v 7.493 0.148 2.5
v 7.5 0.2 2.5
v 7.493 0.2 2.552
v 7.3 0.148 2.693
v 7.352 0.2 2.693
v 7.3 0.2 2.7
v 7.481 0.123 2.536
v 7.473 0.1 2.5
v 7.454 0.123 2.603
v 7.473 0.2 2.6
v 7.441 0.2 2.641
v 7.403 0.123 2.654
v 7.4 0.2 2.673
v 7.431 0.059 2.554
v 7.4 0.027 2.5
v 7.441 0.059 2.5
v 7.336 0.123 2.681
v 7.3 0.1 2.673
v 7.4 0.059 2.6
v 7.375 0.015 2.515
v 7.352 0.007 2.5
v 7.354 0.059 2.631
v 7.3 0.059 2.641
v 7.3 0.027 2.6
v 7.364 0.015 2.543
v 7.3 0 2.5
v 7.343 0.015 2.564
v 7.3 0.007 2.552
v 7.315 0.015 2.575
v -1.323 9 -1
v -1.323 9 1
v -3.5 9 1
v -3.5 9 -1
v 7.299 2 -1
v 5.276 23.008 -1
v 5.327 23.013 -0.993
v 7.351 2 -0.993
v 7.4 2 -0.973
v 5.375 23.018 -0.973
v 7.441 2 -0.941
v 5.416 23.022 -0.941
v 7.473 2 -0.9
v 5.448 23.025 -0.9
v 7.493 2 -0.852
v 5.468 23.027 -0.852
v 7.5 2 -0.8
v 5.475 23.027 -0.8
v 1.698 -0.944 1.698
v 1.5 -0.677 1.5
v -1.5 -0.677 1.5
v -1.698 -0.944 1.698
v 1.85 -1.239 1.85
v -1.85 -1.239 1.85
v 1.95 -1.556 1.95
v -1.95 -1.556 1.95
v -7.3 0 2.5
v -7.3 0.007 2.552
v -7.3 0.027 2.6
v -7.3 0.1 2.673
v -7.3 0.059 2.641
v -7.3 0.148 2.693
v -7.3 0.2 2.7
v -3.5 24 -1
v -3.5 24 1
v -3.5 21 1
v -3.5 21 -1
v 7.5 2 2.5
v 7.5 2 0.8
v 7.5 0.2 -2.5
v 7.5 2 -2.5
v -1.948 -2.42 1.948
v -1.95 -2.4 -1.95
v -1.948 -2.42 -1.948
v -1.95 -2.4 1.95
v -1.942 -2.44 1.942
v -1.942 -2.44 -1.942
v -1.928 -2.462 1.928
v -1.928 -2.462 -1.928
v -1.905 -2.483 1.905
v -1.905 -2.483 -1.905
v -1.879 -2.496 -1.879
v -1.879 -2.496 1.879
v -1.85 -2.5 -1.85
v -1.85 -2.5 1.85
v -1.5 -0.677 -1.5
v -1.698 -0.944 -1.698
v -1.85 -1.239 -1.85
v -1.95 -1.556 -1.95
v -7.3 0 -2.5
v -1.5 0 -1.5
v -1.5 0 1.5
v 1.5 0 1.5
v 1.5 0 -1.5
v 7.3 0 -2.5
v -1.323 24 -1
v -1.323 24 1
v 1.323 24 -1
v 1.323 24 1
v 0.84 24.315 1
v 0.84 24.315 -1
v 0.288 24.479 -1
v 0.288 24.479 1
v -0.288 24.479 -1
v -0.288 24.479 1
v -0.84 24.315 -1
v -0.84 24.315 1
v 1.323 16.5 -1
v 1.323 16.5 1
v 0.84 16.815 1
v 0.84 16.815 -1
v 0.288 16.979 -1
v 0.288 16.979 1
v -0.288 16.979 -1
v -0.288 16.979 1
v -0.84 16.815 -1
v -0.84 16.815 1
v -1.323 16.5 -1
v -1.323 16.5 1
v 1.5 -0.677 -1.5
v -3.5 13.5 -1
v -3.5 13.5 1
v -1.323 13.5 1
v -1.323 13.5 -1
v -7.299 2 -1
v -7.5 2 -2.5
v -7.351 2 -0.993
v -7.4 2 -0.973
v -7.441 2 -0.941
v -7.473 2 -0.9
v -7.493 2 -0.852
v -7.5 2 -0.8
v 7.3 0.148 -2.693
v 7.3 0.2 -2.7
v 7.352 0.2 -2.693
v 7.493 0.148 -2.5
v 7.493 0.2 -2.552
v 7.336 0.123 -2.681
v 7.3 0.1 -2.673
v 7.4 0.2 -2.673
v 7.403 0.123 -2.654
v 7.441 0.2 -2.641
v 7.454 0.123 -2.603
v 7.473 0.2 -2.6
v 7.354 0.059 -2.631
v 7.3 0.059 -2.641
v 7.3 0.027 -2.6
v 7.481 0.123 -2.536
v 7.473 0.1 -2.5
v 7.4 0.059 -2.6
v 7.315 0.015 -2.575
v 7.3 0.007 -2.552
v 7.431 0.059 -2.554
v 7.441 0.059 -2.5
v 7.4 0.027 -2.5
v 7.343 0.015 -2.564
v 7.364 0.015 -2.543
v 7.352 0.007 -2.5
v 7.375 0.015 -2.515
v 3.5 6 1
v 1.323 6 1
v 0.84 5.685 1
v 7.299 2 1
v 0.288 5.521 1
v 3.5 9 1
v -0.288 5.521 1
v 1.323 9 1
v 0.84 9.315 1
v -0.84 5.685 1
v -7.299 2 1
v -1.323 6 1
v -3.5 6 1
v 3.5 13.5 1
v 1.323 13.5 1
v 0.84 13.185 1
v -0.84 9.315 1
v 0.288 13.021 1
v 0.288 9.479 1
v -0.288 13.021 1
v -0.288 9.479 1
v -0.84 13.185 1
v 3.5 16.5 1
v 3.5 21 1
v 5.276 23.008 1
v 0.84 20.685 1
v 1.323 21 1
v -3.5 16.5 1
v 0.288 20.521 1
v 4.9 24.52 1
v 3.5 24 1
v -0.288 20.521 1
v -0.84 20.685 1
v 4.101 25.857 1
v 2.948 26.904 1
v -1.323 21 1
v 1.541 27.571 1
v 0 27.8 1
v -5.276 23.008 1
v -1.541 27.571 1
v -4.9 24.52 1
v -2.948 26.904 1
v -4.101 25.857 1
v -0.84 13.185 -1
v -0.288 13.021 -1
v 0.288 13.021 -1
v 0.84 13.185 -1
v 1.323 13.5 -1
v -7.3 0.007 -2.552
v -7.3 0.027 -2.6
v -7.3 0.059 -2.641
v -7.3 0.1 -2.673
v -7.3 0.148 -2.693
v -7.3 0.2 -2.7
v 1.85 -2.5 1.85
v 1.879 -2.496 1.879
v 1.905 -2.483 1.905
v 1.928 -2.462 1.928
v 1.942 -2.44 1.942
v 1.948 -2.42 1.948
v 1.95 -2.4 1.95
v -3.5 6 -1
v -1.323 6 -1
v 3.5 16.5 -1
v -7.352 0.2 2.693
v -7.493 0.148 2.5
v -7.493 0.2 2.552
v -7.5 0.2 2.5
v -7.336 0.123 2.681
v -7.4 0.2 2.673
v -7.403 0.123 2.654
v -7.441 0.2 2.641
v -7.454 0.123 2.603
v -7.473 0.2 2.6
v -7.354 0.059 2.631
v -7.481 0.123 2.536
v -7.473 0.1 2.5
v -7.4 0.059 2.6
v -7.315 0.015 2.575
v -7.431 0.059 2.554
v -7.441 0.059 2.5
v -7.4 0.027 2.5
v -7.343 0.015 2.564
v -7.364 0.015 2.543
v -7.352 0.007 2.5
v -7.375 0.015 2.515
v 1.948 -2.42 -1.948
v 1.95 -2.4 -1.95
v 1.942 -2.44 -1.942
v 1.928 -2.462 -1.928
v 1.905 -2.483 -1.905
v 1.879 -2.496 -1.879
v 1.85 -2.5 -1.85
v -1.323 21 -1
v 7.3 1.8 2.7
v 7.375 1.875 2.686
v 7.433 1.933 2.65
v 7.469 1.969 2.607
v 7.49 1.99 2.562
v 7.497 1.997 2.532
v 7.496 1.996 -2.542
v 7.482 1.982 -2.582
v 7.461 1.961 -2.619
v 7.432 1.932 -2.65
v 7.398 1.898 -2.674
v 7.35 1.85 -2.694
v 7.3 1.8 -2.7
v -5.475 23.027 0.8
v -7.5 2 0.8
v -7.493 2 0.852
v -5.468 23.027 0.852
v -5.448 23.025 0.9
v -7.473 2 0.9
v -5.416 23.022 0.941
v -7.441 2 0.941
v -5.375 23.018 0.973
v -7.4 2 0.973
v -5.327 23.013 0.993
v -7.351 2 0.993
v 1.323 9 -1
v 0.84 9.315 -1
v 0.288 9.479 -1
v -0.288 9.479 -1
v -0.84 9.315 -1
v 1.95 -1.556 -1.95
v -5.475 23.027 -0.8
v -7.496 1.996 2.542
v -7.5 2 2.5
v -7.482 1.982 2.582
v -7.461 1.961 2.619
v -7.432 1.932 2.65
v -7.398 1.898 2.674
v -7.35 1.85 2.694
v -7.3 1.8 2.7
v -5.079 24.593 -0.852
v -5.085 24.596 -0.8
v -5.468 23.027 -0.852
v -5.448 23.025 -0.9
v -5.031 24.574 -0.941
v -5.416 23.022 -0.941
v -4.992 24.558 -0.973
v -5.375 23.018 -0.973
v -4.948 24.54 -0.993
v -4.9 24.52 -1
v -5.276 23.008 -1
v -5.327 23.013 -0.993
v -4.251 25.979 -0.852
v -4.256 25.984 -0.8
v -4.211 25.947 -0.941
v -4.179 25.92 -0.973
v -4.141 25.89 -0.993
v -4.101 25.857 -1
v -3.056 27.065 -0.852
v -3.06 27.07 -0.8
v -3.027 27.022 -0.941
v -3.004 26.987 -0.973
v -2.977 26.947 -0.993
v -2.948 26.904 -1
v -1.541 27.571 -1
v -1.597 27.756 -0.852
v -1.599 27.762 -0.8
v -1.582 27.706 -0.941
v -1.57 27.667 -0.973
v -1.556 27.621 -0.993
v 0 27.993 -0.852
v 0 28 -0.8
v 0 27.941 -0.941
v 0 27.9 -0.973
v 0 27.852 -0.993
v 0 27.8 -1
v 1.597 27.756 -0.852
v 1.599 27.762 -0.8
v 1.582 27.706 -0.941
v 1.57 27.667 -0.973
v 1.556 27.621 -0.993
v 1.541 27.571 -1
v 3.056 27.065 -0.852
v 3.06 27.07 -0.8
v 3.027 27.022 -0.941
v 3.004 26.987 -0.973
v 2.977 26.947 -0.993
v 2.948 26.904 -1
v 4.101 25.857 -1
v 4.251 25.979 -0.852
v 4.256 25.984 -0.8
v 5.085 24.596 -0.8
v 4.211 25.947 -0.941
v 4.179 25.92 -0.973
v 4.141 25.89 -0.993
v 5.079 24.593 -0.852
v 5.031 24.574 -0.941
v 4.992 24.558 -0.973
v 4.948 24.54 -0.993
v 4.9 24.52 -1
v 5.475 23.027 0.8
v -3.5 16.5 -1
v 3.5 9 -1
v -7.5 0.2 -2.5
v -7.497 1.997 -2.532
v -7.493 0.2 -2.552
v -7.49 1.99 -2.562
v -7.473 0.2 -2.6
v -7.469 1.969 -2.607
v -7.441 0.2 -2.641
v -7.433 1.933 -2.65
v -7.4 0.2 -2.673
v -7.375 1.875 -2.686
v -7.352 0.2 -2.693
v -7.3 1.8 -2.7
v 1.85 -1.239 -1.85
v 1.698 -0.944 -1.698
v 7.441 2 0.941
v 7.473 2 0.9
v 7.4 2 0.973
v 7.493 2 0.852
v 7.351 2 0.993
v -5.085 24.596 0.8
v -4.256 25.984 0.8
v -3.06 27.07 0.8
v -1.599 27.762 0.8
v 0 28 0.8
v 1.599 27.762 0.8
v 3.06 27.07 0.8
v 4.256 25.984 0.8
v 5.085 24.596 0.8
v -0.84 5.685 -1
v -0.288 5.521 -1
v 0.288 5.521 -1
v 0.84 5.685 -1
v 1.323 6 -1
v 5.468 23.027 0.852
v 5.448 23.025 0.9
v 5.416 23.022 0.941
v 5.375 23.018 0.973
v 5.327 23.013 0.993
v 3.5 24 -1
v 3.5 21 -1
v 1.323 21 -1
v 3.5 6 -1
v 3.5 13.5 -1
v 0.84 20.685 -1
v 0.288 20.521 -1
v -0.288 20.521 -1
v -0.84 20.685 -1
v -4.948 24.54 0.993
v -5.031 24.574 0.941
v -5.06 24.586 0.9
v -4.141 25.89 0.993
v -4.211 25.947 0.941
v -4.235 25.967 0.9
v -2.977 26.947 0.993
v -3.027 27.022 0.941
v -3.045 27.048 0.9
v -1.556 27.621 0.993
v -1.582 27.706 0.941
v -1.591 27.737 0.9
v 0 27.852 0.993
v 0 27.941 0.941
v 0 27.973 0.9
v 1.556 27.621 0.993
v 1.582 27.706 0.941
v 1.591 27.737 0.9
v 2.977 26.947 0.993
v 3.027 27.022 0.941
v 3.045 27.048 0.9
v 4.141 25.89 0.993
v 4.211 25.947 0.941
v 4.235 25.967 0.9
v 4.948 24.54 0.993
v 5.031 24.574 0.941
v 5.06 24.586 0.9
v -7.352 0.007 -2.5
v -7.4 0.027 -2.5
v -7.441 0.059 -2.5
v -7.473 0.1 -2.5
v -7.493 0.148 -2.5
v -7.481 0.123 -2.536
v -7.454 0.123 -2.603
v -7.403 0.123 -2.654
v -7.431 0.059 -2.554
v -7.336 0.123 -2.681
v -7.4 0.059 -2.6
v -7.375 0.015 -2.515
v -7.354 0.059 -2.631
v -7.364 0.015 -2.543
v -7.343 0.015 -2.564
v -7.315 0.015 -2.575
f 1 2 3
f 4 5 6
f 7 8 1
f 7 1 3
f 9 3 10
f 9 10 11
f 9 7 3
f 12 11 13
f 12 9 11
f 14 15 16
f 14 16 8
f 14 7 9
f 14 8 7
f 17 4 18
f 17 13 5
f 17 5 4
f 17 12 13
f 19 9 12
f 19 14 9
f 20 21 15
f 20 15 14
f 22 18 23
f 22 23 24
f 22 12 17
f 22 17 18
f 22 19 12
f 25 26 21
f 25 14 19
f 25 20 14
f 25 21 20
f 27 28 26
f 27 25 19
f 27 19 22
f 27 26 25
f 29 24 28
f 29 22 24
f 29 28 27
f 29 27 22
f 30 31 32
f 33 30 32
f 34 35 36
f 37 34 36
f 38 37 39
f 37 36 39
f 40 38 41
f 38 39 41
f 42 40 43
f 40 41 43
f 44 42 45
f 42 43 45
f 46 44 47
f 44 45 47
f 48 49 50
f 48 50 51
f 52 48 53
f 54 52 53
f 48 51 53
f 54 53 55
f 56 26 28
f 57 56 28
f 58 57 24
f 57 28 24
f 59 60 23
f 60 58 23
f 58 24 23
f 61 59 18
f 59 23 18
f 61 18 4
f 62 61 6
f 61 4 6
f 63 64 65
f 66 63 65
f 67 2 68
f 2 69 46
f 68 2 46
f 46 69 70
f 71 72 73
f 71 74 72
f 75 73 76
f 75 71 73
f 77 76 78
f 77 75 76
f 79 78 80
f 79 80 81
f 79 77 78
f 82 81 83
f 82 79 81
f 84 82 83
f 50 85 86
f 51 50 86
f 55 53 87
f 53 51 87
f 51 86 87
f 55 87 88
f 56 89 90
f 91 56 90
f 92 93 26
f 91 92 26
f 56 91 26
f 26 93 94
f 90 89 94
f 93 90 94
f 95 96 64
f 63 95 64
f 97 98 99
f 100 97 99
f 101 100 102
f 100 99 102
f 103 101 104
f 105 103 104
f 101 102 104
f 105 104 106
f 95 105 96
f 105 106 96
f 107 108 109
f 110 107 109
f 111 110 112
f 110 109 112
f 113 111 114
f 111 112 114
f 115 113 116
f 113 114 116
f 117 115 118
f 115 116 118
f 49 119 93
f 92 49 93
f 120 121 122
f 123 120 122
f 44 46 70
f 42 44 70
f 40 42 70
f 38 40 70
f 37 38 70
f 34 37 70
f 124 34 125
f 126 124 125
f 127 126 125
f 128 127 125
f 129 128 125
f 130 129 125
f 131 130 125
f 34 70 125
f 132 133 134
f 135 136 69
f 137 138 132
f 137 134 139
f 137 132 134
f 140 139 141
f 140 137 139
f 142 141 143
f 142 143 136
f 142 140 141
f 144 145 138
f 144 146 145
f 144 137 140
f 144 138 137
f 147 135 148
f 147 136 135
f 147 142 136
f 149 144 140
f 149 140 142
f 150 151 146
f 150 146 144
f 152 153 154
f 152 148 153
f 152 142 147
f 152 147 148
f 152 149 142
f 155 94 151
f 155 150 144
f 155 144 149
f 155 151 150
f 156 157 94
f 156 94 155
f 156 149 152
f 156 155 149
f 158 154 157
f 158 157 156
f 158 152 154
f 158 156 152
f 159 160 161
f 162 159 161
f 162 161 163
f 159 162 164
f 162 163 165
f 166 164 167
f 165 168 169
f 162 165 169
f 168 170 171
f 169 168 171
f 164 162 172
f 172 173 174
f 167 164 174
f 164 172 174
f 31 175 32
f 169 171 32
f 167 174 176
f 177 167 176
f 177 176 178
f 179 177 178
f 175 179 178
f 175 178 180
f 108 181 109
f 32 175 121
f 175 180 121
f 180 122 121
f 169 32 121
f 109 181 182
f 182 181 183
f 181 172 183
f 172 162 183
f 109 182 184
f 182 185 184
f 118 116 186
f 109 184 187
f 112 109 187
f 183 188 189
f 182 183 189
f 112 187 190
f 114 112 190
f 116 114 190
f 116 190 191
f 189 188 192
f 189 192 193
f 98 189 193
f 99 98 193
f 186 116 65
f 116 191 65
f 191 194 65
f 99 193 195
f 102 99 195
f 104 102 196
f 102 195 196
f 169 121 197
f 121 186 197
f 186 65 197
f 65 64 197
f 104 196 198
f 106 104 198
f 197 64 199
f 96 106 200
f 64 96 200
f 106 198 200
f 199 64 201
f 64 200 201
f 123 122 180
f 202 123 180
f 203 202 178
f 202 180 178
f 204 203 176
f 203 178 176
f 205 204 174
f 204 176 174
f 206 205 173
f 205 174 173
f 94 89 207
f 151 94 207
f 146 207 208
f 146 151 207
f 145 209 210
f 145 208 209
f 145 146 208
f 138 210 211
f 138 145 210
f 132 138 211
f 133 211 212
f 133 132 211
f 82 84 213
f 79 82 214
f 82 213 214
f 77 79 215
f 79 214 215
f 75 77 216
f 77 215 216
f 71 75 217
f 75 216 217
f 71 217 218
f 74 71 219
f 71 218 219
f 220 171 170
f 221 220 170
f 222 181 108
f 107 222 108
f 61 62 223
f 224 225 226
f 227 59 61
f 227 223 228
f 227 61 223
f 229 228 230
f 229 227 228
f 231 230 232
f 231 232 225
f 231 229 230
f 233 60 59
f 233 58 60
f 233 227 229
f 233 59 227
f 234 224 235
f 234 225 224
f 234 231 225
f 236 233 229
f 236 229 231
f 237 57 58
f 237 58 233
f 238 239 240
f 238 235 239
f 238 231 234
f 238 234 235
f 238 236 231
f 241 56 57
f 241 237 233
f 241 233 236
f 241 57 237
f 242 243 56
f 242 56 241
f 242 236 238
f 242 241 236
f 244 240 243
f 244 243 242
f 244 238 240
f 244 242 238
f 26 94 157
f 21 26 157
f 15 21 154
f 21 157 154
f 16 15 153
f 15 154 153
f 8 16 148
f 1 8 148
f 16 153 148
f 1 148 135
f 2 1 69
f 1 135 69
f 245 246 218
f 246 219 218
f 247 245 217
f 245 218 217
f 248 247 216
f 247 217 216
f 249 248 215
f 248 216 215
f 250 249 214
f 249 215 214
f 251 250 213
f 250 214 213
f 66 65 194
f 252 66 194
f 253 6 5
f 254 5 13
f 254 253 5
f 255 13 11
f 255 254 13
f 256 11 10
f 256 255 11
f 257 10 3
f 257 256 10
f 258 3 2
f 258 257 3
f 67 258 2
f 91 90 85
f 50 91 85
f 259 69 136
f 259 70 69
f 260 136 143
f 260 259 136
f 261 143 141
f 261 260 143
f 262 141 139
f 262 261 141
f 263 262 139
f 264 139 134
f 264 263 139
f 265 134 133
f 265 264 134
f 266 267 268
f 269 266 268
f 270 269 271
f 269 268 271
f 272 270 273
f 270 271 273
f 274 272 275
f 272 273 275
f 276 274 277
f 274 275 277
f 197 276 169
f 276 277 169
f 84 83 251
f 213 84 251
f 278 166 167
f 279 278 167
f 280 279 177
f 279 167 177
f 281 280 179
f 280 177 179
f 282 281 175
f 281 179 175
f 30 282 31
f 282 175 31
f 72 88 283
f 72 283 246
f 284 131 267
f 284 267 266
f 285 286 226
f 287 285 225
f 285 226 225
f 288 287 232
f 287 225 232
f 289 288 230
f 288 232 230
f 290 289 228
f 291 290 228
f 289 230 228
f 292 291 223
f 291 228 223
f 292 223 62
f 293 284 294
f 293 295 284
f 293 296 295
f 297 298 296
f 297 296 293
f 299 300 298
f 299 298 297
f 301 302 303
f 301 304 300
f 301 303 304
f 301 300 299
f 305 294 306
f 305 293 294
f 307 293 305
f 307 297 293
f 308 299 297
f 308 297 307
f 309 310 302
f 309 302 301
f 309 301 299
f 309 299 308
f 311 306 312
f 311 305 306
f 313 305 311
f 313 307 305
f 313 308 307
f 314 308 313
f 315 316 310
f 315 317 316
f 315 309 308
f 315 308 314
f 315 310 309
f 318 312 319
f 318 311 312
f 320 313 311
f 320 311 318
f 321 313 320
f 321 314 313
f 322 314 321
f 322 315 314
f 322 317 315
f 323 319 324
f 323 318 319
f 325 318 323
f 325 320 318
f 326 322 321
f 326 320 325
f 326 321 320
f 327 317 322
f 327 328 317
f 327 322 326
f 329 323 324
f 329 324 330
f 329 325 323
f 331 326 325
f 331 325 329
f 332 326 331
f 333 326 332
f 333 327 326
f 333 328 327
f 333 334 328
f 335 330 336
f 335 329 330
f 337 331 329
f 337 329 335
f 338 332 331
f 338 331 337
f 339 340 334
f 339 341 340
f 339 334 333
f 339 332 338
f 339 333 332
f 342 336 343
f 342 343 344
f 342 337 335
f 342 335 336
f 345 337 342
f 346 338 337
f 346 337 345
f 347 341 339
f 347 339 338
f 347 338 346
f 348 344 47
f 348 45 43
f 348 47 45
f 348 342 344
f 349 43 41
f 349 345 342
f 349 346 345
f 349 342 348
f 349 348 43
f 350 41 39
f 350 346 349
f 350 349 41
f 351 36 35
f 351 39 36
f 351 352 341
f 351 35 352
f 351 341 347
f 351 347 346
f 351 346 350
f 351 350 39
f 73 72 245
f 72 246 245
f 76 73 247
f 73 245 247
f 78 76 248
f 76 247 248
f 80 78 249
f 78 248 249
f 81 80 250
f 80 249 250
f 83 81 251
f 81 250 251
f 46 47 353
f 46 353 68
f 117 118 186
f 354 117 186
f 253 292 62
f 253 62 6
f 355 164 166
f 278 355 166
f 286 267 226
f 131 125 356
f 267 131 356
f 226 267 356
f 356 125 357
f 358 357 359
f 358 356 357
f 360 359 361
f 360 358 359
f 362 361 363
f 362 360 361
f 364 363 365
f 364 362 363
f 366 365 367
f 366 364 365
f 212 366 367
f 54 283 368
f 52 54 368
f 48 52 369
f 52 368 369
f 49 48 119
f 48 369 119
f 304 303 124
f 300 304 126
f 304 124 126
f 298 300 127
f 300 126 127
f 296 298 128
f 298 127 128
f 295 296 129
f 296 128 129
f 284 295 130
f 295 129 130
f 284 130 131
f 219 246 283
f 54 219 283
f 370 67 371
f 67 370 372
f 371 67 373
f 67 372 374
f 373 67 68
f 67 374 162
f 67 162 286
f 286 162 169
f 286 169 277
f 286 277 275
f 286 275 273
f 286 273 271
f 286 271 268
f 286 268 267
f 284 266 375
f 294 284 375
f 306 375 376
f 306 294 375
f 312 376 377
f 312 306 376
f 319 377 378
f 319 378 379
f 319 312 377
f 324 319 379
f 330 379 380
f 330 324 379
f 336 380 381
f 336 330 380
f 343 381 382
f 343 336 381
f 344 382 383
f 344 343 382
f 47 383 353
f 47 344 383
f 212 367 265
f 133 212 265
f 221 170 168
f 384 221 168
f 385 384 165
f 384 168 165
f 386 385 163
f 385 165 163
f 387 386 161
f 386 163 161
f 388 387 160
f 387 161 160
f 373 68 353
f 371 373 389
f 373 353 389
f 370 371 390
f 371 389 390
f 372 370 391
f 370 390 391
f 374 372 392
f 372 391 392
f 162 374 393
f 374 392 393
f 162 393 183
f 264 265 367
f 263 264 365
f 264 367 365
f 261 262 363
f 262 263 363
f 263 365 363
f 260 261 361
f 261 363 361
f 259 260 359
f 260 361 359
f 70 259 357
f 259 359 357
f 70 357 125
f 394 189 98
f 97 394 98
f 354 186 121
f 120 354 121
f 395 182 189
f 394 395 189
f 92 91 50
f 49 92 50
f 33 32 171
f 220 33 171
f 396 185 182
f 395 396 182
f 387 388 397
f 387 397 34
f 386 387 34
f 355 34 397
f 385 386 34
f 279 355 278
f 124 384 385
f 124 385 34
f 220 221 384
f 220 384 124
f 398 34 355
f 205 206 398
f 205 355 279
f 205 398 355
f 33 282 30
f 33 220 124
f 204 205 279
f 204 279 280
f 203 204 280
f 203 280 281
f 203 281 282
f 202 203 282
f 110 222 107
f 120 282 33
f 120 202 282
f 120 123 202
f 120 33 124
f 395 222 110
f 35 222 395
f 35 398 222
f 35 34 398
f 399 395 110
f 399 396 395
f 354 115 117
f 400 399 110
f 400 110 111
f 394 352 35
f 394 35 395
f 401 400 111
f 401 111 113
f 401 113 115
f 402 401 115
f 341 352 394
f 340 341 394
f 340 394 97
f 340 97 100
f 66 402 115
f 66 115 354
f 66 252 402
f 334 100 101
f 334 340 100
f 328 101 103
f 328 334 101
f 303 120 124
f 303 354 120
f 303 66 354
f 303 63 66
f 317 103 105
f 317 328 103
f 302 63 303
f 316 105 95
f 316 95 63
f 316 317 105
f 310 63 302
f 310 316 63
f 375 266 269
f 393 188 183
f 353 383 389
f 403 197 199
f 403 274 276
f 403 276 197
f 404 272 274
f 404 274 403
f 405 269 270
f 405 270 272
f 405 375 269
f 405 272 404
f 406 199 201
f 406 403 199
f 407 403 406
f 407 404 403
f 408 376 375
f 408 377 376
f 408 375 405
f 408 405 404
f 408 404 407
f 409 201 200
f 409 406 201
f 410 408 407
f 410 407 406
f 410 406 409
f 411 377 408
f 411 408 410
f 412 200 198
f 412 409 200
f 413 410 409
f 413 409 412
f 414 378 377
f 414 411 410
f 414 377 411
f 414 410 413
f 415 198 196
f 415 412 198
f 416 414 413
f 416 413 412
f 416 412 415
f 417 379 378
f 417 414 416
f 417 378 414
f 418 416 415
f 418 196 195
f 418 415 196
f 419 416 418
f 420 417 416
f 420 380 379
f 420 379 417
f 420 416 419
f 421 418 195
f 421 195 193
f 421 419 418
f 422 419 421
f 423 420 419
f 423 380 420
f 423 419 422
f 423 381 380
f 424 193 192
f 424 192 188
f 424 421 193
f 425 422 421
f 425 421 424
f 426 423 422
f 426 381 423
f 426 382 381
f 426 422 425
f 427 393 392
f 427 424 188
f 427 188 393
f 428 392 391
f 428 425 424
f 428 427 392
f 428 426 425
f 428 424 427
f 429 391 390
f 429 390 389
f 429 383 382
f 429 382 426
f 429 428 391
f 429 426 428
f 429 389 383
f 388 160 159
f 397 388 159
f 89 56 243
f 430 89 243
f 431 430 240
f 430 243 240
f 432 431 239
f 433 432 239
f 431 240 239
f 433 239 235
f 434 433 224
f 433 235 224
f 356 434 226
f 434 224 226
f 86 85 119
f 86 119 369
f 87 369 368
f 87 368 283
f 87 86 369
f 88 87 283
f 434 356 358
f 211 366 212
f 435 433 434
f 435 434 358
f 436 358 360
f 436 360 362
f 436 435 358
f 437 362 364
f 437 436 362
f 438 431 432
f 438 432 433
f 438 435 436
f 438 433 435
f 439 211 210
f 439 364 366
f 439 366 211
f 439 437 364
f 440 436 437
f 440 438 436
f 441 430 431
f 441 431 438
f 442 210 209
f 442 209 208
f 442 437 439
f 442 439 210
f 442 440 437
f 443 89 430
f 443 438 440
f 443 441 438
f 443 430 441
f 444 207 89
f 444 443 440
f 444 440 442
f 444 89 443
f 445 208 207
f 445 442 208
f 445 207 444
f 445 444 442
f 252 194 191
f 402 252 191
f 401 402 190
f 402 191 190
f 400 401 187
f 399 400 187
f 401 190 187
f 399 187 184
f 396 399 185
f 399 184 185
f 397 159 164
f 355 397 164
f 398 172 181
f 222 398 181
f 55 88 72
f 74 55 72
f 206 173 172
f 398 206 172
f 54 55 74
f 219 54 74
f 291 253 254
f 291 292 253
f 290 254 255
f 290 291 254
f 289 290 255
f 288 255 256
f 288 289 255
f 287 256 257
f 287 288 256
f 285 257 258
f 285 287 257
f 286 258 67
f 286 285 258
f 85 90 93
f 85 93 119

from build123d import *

# Parameters (mm, degrees)
EXTRUDE_1_DEPTH          = 2.7
EXTRUDE_1_DEPTH_BACK     = 2.7
EXTRUDE_2_DEPTH          = 1
EXTRUDE_2_DEPTH_BACK     = 1
CUT_EXTRUDE_1_DEPTH      = 30.222251796
PATTERN_LINEAR_1_COUNT   = 3
PATTERN_LINEAR_1_PITCH   = 7.5
EXTRUDE_3_DEPTH          = 2
EXTRUDE_3_DEPTH_BACK     = 2
CUT_EXTRUDE_2_DEPTH      = 2
CUT_EXTRUDE_2_DEPTH_BACK = 2
FILLET_1_R               = 0.1
FILLET_4_R               = 0.2
FILLET_5_R               = 0.2
FILLET_8_R               = 0.2


with BuildPart() as part:
    # 草图1 → 凸台-拉伸1 (new, two sides: drawn at the far end of the back side and taken through both)
    with BuildSketch(Plane.XY.offset(-EXTRUDE_1_DEPTH_BACK)):
        Polygon((0, 0), (7.5, 0), (7.5, 2), (-7.5, 2), (-7.5, 0), align=None)
    extrude(amount=EXTRUDE_1_DEPTH + EXTRUDE_1_DEPTH_BACK)

    # 草图2 → 凸台-拉伸2 (add, two sides: drawn at the far end of the back side and taken through both)
    with BuildSketch(Plane.XY.offset(-EXTRUDE_2_DEPTH_BACK)):
        with BuildLine():
            Line((-7.5, 2), (-5.474663278, 23.027315834))
            ThreePointArc((-5.474663278, 23.027315834), (0, 28), (5.474663278, 23.027315834))
            Line((5.474663278, 23.027315834), (7.5, 2))
            Line((7.5, 2), (-7.5, 2))
        make_face()
    extrude(amount=EXTRUDE_2_DEPTH + EXTRUDE_2_DEPTH_BACK)

    # 草图3 → 切除-拉伸1 (cut, through all)
    with BuildSketch(Plane.XY.offset(1)):
        with BuildLine():
            Line((3.5, 6), (3.5, 9))
            Line((3.5, 9), (1.322875656, 9))
            ThreePointArc((1.322875656, 9), (0, 9.5), (-1.322875656, 9))
            Line((-1.322875656, 9), (-3.5, 9))
            Line((-3.5, 9), (-3.5, 6))
            Line((-3.5, 6), (-1.322875656, 6))
            ThreePointArc((-1.322875656, 6), (0, 5.5), (1.322875656, 6))
            Line((1.322875656, 6), (3.5, 6))
        make_face()
    cut_extrude_1 = extrude(amount=-CUT_EXTRUDE_1_DEPTH, mode=Mode.SUBTRACT)

    # 阵列(线性)1: 切除-拉伸1 ×3
    with Locations(*[(0, i * PATTERN_LINEAR_1_PITCH, 0) for i in range(1, PATTERN_LINEAR_1_COUNT)]):
        add(cut_extrude_1, mode=Mode.SUBTRACT)

    # 草图4 → 凸台-拉伸3 (add, two sides: drawn at the far end of the back side and taken through both)
    with BuildSketch(Plane.XY.offset(-EXTRUDE_3_DEPTH_BACK)):
        with BuildLine():
            Line((1.5, 0), (-1.5, 0))
            Line((-1.5, 0), (-1.5, -0.677124344))
            ThreePointArc((-1.5, -0.677124344), (-1.780042303, -1.088161527), (-1.95, -1.555590279))
            Line((-1.95, -1.555590279), (-1.95, -2.5))
            Line((-1.95, -2.5), (1.95, -2.5))
            Line((1.95, -2.5), (1.95, -1.555590279))
            ThreePointArc((1.95, -1.555590279), (1.780042303, -1.088161527), (1.5, -0.677124344))
            Line((1.5, -0.677124344), (1.5, 0))
        make_face()
    extrude(amount=EXTRUDE_3_DEPTH + EXTRUDE_3_DEPTH_BACK)

    # 草图5 → 切除-拉伸2 (cut, two sides: drawn at the far end of the back side and taken through both)
    with BuildSketch(Plane(origin=(0, 0, 0), x_dir=(0, 0, -1), z_dir=(1, 0, 0)).offset(-CUT_EXTRUDE_2_DEPTH_BACK)):
        with BuildLine():
            Line((1.5, 0), (1.5, -0.677124344))
            ThreePointArc((1.5, -0.677124344), (1.780042303, -1.088161527), (1.95, -1.555590279))
            Line((1.95, -1.555590279), (1.95, -2.5))
            Line((1.95, -2.5), (2, -2.5))
            Line((2, -2.5), (2, 0))
            Line((2, 0), (1.5, 0))
        make_face()
        with BuildLine():
            Line((-2, 0), (-1.5, 0))
            Line((-1.5, 0), (-1.5, -0.677124344))
            ThreePointArc((-1.5, -0.677124344), (-1.780042303, -1.088161527), (-1.95, -1.555590279))
            Line((-1.95, -1.555590279), (-1.95, -2.5))
            Line((-1.95, -2.5), (-2, -2.5))
            Line((-2, -2.5), (-2, 0))
        make_face()
    extrude(amount=CUT_EXTRUDE_2_DEPTH + CUT_EXTRUDE_2_DEPTH_BACK, mode=Mode.SUBTRACT)

    # 圆角1
    fillet_1_edges = [part.edges().sort_by_distance(p)[0] for p in [
        (-1.95, -2.5, 0),
        (1.95, -2.5, 0),
        (0, -2.5, -1.95),
        (0, -2.5, 1.95),
    ]]
    fillet(fillet_1_edges, radius=FILLET_1_R)

    # 圆角4
    fillet_4_edges = [part.edges().sort_by_distance(p)[0] for p in [
        (-7.5, 1, 2.7),
        (0, 2, 2.7),
        (7.5, 1, 2.7),
        (0, 0, 2.7),
        (7.5, 1, -2.7),
        (0, 2, -2.7),
        (-7.5, 1, -2.7),
        (0, 0, -2.7),
    ]]
    fillet(fillet_4_edges, radius=FILLET_4_R)

    # 圆角5
    # the kernel refuses this fillet: 0.2 mm, written as the material it takes off along each edge
    with BuildSketch(Plane(origin=(7.3, 0.2, 2.5), x_dir=(1, 0, 0), z_dir=(0, -1, 0))) as fillet_5_piece_1_section:
        Polygon((0, 0), (FILLET_5_R, 0), (FILLET_5_R, FILLET_5_R), (0, FILLET_5_R), align=None)
    fillet_5_piece_1 = extrude(amount=FILLET_5_R, mode=Mode.PRIVATE)
    fillet_5_piece_1 = fillet_5_piece_1 - Plane(origin=(7.3, 0.2, 2.5), x_dir=(-0.7071067811865475, 0, -0.7071067811865475), z_dir=(0, -1, 0)) * Sphere(FILLET_5_R, mode=Mode.PRIVATE)
    add(fillet_5_piece_1, mode=Mode.SUBTRACT)
    with BuildSketch(Plane(origin=(-7.3, 0.2, 2.5), x_dir=(-1, 0, 0), z_dir=(0, -1, 0))) as fillet_5_piece_2_section:
        Polygon((0, 0), (FILLET_5_R, 0), (FILLET_5_R, -FILLET_5_R), (0, -FILLET_5_R), align=None)
    fillet_5_piece_2 = extrude(amount=FILLET_5_R, mode=Mode.PRIVATE)
    fillet_5_piece_2 = fillet_5_piece_2 - Plane(origin=(-7.3, 0.2, 2.5), x_dir=(0.7071067811865475, 1.2560739669470211e-15, -0.7071067811865475), z_dir=(0, -1, 0)) * Sphere(FILLET_5_R, mode=Mode.PRIVATE)
    add(fillet_5_piece_2, mode=Mode.SUBTRACT)
    with BuildSketch(Plane(origin=(-7.3, 0.2, -2.5), x_dir=(-1, 0, 0), z_dir=(0, -1, 0))) as fillet_5_piece_3_section:
        Polygon((0, 0), (FILLET_5_R, 0), (FILLET_5_R, FILLET_5_R), (0, FILLET_5_R), align=None)
    fillet_5_piece_3 = extrude(amount=FILLET_5_R, mode=Mode.PRIVATE)
    fillet_5_piece_3 = fillet_5_piece_3 - Plane(origin=(-7.3, 0.2, -2.5), x_dir=(0.7071067811865475, 1.2560739669470211e-15, 0.7071067811865475), z_dir=(0, -1, 0)) * Sphere(FILLET_5_R, mode=Mode.PRIVATE)
    add(fillet_5_piece_3, mode=Mode.SUBTRACT)
    with BuildSketch(Plane(origin=(7.3, 0.2, -2.5), x_dir=(1, 0, 0), z_dir=(0, -1, 0))) as fillet_5_piece_4_section:
        Polygon((0, 0), (FILLET_5_R, 0), (FILLET_5_R, -FILLET_5_R), (0, -FILLET_5_R), align=None)
    fillet_5_piece_4 = extrude(amount=FILLET_5_R, mode=Mode.PRIVATE)
    fillet_5_piece_4 = fillet_5_piece_4 - Plane(origin=(7.3, 0.2, -2.5), x_dir=(-0.7071067811865475, 0, 0.7071067811865475), z_dir=(0, -1, 0)) * Sphere(FILLET_5_R, mode=Mode.PRIVATE)
    add(fillet_5_piece_4, mode=Mode.SUBTRACT)
    with BuildSketch(Plane(origin=(-7.5, 0, 2.5), x_dir=(1, 0, 0), z_dir=(0, 0, -1)), Plane(origin=(7.5, 0, -2.5), x_dir=(-1, 0, 0), z_dir=(0, 0, 1))) as fillet_5_piece_5:
        with BuildLine():
            CenterArc((FILLET_5_R, -FILLET_5_R), FILLET_5_R, 90, 90)
            Line((0, -FILLET_5_R), (0, 0))
            Line((0, 0), (FILLET_5_R, 0))
        make_face()
    extrude(amount=5, mode=Mode.SUBTRACT)

    # 圆角8
    # the kernel refuses this fillet: 0.2 mm, written as the material it takes off along each edge
    with BuildSketch(Plane(origin=(-7.547937803, 1.502303338, 1), x_dir=(0, 0, -1), z_dir=(0.09587560610090687, 0.9953933233424785, 0))) as fillet_8_piece_1_section:
        with BuildLine():
            CenterArc((FILLET_8_R, -FILLET_8_R), FILLET_8_R, 90, 90)
            Line((0, -FILLET_8_R), (0, 0))
            Line((0, 0), (FILLET_8_R, 0))
        make_face()
    fillet_8_piece_1 = extrude(amount=21.624630174, mode=Mode.PRIVATE)
    fillet_8_piece_1 = split(fillet_8_piece_1, bisect_by=Plane(origin=(-6.442060612, 2, 0.954715968), z_dir=(0, 1, 0)), keep=Keep.TOP, mode=Mode.PRIVATE)
    add(fillet_8_piece_1, mode=Mode.SUBTRACT)
    with BuildSketch(Plane(origin=(5.474663278, 23.027315834, -1), x_dir=(0, 0, 1), z_dir=(0.09587560610090687, -0.9953933233424785, 0))) as fillet_8_piece_2_section:
        with BuildLine():
            CenterArc((FILLET_8_R, FILLET_8_R), FILLET_8_R, 180, 90)
            Line((0, FILLET_8_R), (0, 0))
            Line((0, 0), (FILLET_8_R, 0))
        make_face()
    fillet_8_piece_2 = extrude(amount=21.624630174, mode=Mode.PRIVATE)
    fillet_8_piece_2 = split(fillet_8_piece_2, bisect_by=Plane(origin=(6.442060612, 2, -0.954715968), z_dir=(0, 1, 0)), keep=Keep.TOP, mode=Mode.PRIVATE)
    add(fillet_8_piece_2, mode=Mode.SUBTRACT)
    with BuildSketch(Plane(origin=(0, 22.5, -1), x_dir=(-0.9953933233424784, 0.09587560610090734, 0), z_dir=(-0.09587560610090734, -0.9953933233424784, 0))) as fillet_8_piece_3:
        with BuildLine():
            CenterArc((5.5 - FILLET_8_R, -FILLET_8_R), FILLET_8_R, 0, 90)
            Line((5.5, -FILLET_8_R), (5.5, 0))
            Line((5.5, 0), (5.5 - FILLET_8_R, 0))
        make_face()
    revolve(axis=Axis((0, 22.5, -1), (0, 0, -1)), revolution_arc=168.996563204, mode=Mode.SUBTRACT)
    with BuildSketch(Plane(origin=(-7.547937803, 1.502303338, -1), x_dir=(0, 0, 1), z_dir=(0.09587560610090687, 0.9953933233424785, 0))) as fillet_8_piece_4_section:
        with BuildLine():
            CenterArc((FILLET_8_R, FILLET_8_R), FILLET_8_R, 180, 90)
            Line((0, FILLET_8_R), (0, 0))
            Line((0, 0), (FILLET_8_R, 0))
        make_face()
    fillet_8_piece_4 = extrude(amount=21.624630174, mode=Mode.PRIVATE)
    fillet_8_piece_4 = split(fillet_8_piece_4, bisect_by=Plane(origin=(-6.442060612, 2, -0.954715968), z_dir=(0, 1, 0)), keep=Keep.TOP, mode=Mode.PRIVATE)
    add(fillet_8_piece_4, mode=Mode.SUBTRACT)
    with BuildSketch(Plane(origin=(0, 22.5, 1), x_dir=(-0.9953933233424784, 0.09587560610090734, 0), z_dir=(-0.09587560610090734, -0.9953933233424784, 0))) as fillet_8_piece_5:
        with BuildLine():
            CenterArc((5.5 - FILLET_8_R, FILLET_8_R), FILLET_8_R, 270, 90)
            Line((5.5 - FILLET_8_R, 0), (5.5, 0))
            Line((5.5, 0), (5.5, FILLET_8_R))
        make_face()
    revolve(axis=Axis((0, 22.5, 1), (0, 0, -1)), revolution_arc=168.996563204, mode=Mode.SUBTRACT)
    with BuildSketch(Plane(origin=(5.474663278, 23.027315834, 1), x_dir=(0, 0, -1), z_dir=(0.09587560610090687, -0.9953933233424785, 0))) as fillet_8_piece_6_section:
        with BuildLine():
            CenterArc((FILLET_8_R, -FILLET_8_R), FILLET_8_R, 90, 90)
            Line((0, -FILLET_8_R), (0, 0))
            Line((0, 0), (FILLET_8_R, 0))
        make_face()
    fillet_8_piece_6 = extrude(amount=21.624630174, mode=Mode.PRIVATE)
    fillet_8_piece_6 = split(fillet_8_piece_6, bisect_by=Plane(origin=(6.442060612, 2, 0.954715968), z_dir=(0, 1, 0)), keep=Keep.TOP, mode=Mode.PRIVATE)
    add(fillet_8_piece_6, mode=Mode.SUBTRACT)


solid = part.part
